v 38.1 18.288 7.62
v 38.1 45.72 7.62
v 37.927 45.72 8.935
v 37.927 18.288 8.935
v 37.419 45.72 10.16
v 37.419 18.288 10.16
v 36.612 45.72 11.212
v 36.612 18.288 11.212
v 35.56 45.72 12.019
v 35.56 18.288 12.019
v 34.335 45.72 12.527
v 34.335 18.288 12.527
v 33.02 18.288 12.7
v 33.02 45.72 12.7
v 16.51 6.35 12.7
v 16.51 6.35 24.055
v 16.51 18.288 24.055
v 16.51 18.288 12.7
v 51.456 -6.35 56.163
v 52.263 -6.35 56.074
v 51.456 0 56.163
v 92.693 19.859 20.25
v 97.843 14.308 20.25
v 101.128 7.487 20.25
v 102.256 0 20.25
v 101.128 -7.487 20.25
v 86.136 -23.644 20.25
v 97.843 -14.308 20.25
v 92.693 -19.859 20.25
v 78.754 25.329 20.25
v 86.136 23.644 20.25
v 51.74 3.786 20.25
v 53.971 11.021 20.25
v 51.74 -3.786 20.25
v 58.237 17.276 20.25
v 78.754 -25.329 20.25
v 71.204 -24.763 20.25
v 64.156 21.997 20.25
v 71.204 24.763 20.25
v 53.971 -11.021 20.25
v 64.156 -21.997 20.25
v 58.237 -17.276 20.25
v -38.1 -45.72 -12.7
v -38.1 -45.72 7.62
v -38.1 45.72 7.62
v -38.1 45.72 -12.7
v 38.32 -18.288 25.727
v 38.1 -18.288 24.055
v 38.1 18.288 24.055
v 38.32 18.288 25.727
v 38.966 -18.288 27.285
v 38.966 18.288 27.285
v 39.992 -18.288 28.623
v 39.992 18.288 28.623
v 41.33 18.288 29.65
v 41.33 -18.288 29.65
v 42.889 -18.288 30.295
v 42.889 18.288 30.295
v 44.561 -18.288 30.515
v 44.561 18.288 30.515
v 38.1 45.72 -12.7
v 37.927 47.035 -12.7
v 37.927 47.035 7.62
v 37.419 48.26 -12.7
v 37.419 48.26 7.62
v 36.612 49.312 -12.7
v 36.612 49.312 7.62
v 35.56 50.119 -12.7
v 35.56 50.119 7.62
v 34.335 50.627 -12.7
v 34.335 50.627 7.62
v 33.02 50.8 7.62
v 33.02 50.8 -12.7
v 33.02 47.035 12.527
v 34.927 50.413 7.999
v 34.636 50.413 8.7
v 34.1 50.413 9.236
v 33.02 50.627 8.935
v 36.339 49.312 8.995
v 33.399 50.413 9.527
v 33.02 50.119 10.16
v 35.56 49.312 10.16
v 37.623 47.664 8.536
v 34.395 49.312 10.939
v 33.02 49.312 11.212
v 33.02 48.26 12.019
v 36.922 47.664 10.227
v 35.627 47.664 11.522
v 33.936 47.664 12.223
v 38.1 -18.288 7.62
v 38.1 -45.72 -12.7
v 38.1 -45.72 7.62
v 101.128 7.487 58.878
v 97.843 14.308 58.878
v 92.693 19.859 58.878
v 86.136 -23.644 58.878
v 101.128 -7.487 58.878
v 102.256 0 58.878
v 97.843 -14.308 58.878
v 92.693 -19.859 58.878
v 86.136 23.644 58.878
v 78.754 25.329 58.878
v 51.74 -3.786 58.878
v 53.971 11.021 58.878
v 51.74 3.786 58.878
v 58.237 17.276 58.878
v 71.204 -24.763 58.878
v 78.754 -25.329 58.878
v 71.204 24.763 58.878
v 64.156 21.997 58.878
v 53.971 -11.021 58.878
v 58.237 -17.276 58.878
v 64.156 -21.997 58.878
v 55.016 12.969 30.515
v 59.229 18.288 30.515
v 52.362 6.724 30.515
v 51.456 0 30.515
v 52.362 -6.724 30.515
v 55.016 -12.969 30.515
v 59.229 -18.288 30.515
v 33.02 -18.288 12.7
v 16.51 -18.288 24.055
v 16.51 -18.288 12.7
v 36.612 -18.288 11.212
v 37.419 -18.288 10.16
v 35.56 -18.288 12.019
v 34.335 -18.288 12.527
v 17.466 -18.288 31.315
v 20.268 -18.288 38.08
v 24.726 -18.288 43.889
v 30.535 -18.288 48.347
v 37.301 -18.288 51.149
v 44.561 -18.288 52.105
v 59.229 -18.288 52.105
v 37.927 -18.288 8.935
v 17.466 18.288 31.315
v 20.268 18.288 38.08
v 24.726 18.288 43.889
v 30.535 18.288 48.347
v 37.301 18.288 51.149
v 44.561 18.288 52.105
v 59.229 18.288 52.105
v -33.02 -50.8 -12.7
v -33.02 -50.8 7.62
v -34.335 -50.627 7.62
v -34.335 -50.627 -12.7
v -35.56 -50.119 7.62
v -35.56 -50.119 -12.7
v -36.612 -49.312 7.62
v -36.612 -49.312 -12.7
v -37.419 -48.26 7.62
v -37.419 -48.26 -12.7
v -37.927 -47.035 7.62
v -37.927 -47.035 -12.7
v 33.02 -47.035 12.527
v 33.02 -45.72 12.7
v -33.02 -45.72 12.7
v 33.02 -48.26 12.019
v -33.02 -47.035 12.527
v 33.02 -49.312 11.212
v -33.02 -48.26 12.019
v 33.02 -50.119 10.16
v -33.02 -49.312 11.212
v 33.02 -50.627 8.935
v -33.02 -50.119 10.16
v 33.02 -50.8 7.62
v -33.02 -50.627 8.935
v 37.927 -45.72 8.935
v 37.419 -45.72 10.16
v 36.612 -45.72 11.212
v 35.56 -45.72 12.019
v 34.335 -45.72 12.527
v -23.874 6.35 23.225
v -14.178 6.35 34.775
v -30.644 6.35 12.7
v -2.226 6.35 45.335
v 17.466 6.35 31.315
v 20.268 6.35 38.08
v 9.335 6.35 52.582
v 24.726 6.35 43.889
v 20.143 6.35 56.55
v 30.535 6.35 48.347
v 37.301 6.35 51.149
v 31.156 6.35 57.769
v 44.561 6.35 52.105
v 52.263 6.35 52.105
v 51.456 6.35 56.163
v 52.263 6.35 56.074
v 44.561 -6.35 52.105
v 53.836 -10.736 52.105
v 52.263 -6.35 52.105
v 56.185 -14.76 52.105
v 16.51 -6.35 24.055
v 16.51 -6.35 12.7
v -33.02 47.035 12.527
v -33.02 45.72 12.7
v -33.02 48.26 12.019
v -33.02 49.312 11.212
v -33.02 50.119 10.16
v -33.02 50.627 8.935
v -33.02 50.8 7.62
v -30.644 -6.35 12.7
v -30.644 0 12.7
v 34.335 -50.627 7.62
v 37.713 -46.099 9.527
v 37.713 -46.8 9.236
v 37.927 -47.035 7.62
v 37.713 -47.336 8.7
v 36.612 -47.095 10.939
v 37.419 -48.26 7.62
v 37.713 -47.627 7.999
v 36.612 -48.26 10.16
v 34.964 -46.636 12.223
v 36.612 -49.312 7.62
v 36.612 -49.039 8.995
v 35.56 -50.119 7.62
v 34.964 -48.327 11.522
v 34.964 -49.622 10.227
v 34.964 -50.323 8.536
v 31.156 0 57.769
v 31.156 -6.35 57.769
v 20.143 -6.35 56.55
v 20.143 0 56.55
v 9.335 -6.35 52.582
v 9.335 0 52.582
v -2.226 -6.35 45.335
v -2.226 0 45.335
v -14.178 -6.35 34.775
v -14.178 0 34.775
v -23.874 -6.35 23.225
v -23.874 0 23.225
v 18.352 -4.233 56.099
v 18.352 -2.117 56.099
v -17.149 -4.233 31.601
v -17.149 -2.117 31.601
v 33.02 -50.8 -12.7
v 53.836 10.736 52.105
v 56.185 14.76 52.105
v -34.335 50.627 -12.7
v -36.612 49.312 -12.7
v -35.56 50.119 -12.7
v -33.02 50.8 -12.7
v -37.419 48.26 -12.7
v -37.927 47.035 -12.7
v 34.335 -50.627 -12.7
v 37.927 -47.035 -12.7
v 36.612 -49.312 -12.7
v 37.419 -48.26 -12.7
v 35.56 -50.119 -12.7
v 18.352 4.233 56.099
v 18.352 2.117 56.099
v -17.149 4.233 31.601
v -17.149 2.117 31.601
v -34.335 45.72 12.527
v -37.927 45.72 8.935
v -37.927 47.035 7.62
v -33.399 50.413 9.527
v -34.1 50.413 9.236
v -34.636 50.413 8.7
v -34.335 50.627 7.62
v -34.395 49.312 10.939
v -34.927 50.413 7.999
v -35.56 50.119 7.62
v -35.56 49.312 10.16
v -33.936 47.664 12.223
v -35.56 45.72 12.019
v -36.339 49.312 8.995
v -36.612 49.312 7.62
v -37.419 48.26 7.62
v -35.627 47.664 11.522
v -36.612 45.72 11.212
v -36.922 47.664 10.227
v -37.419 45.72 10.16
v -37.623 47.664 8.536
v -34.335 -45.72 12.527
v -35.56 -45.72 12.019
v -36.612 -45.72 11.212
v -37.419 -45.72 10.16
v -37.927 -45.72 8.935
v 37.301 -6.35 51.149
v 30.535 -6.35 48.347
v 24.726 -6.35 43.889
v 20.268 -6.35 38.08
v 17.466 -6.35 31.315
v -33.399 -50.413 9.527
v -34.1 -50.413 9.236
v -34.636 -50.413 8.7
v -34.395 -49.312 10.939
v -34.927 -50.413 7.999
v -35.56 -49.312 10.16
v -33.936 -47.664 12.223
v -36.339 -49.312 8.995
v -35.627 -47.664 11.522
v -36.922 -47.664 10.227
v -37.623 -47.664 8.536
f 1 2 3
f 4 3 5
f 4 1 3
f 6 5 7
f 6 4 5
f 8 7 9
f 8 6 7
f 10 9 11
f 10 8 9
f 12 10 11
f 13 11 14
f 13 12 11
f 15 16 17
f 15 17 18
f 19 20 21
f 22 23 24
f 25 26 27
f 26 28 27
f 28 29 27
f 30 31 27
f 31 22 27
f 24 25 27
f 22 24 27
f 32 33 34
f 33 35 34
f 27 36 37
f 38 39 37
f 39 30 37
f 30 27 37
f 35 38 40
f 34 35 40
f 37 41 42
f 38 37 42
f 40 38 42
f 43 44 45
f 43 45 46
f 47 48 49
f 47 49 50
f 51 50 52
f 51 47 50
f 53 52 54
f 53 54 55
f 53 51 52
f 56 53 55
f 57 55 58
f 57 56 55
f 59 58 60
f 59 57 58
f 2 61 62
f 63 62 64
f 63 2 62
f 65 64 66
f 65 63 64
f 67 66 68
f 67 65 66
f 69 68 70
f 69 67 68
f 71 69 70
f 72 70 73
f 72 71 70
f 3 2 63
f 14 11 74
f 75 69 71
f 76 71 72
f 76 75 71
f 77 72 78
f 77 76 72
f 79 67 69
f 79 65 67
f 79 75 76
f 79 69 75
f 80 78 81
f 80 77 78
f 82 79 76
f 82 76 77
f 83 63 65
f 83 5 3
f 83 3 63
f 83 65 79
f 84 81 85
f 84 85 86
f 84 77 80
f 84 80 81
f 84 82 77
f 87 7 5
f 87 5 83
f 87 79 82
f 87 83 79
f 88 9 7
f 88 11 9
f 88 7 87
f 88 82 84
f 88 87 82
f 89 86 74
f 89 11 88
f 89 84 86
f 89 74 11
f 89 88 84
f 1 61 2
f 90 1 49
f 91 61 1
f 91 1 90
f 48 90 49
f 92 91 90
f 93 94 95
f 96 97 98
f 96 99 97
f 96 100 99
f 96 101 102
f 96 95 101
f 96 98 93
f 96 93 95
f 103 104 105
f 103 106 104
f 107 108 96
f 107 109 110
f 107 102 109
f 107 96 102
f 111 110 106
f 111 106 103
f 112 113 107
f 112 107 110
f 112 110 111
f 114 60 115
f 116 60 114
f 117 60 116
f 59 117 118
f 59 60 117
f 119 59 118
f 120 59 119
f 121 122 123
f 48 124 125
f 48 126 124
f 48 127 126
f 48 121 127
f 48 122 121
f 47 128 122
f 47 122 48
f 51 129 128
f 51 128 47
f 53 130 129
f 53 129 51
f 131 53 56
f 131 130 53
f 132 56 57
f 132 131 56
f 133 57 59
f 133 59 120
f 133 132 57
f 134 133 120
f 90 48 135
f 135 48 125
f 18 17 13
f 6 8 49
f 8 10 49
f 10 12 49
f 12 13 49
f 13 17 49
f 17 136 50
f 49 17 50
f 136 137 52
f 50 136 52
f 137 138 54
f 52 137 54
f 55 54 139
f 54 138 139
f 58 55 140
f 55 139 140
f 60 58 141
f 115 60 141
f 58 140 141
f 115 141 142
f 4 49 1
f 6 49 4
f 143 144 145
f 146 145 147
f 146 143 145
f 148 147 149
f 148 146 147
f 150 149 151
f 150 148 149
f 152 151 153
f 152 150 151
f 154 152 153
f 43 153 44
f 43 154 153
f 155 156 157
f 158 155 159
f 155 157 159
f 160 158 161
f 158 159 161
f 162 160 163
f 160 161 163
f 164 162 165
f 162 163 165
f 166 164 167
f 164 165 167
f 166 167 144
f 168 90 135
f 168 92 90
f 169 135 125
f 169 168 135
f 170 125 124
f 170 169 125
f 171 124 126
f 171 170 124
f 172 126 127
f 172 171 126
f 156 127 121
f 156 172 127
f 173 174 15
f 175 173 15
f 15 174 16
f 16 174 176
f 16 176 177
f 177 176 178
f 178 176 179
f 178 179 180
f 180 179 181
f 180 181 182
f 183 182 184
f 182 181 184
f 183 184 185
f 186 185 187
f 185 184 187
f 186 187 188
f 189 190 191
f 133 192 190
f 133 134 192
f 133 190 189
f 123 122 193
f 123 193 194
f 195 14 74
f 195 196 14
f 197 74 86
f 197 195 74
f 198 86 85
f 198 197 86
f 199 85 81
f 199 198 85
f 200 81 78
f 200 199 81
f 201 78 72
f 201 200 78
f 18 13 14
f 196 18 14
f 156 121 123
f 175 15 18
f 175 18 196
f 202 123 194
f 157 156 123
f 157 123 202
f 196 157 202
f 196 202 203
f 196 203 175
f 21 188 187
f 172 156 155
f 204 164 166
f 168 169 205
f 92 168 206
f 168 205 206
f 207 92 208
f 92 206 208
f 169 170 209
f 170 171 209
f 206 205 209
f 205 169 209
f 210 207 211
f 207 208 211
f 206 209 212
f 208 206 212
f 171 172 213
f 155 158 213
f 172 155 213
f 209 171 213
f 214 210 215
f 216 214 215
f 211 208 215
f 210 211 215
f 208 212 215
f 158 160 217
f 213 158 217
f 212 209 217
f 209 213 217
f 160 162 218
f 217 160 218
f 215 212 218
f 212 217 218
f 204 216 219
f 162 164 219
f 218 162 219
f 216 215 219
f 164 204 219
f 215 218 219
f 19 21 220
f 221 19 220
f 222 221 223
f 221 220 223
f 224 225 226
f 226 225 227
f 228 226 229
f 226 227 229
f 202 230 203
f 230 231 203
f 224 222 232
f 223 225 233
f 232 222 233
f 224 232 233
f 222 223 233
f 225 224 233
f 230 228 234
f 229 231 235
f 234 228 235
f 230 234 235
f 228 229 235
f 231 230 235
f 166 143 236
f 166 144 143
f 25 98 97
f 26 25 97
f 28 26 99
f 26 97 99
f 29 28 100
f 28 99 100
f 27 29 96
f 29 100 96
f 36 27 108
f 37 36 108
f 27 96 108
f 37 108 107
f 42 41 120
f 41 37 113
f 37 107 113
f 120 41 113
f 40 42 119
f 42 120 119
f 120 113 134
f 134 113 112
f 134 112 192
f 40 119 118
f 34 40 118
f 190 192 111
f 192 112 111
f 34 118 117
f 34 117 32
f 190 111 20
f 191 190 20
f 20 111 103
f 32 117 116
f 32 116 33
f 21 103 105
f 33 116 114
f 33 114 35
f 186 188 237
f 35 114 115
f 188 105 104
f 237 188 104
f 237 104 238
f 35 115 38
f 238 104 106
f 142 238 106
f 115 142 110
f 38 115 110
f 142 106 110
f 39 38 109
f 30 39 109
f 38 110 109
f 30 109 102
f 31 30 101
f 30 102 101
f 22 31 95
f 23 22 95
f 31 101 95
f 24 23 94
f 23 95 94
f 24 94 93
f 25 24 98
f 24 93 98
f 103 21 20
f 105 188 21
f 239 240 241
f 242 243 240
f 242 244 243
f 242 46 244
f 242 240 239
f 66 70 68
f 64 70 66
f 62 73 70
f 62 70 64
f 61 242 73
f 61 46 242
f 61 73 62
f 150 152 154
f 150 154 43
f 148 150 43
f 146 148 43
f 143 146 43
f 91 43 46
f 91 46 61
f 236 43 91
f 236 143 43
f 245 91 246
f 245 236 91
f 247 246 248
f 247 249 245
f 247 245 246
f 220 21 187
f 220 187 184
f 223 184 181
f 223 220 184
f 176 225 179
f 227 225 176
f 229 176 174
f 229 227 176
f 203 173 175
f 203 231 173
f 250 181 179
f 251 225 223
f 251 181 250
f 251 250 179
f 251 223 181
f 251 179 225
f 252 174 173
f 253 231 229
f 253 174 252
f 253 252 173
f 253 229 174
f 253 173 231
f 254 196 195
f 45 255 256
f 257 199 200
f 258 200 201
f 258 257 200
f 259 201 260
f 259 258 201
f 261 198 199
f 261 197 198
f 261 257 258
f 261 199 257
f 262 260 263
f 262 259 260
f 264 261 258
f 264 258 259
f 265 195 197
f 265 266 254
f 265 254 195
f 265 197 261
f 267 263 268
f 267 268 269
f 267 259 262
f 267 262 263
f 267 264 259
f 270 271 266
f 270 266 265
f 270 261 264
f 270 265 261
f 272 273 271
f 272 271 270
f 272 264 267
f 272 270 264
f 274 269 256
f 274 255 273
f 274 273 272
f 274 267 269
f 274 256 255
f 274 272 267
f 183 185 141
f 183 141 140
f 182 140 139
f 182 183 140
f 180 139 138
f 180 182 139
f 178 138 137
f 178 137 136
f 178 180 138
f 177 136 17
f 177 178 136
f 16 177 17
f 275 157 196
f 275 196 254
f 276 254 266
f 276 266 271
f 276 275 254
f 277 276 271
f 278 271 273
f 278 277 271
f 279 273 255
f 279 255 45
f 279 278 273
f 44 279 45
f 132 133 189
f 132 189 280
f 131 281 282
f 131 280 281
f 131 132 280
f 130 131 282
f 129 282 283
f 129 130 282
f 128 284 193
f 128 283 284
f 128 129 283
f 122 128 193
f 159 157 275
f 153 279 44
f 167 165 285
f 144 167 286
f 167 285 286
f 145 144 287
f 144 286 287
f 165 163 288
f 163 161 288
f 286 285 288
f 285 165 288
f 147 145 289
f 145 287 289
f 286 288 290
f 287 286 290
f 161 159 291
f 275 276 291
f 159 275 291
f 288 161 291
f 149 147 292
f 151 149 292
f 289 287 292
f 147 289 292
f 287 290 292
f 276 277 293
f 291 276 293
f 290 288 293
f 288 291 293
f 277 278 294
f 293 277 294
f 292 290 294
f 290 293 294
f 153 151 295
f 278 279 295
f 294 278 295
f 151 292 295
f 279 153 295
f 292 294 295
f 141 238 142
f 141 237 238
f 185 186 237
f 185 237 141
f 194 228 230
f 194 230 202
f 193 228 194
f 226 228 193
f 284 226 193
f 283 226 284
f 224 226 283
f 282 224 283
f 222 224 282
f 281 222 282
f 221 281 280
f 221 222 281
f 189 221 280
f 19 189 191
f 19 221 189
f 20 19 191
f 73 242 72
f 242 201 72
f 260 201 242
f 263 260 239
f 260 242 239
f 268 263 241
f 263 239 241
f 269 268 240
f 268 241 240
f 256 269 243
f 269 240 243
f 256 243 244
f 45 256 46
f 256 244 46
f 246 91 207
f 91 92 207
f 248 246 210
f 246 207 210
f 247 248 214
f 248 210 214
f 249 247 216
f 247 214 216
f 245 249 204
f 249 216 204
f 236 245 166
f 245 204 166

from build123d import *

# Parameters (mm, degrees)
F1_DEPTH = 50.8
F2_DEPTH = 18.288
F3_DEPTH = 6.35
F0_W     = 25.4
F0_H     = 38.6286331601
F5_R     = 5.08


with BuildPart() as f1:
    # F0 (on Front) → F1 (new body, symmetric)
    with BuildSketch(Plane.XZ):
        Polygon((38.1, -12.7), (38.1, 12.7), (16.5100004677, 12.7), (-30.6439399719, 12.7), (-38.1, 12.7), (-38.1, -12.7), align=None)
    extrude(amount=F1_DEPTH, both=True)

    # F0 (on Front) → F2 (join, symmetric)
    with BuildSketch(Plane.XZ):
        with BuildLine():
            Line((16.5100004677, 12.7), (38.1, 12.7))
            Line((38.1, 12.7), (38.1, 24.0545344999))
            ThreePointArc((38.1, 24.0545344999), (39.9923105597, 28.6229763174), (44.5607523772, 30.5152868771))
            Line((44.5607523772, 30.5152868771), (51.4560379088, 30.5152868771))
            Line((51.4560379088, 30.5152868771), (51.4560379088, 52.1052864094))
            Line((51.4560379088, 52.1052864094), (44.5607523772, 52.1052864094))
            ThreePointArc((44.5607523772, 52.1052864094), (24.7258754846, 43.8894113925), (16.5100004677, 24.0545344999))
            Line((16.5100004677, 24.0545344999), (16.5100004677, 12.7))
        make_face()
        Polygon((51.4560379088, 52.1052864094), (51.4560379088, 30.5152868771), (64.020066675, 30.5152868771), (64.020066675, 52.1052864094), (58.4391281009, 52.1052864094), align=None)
    extrude(amount=F2_DEPTH, both=True)

    # F0 (on Front) → F3 (join, symmetric)
    with BuildSketch(Plane.XZ):
        with BuildLine():
            Line((-30.6439399719, 12.7), (16.5100004677, 12.7))
            Line((16.5100004677, 12.7), (16.5100004677, 24.0545344999))
            ThreePointArc((16.5100004677, 24.0545344999), (24.7258754846, 43.8894113925), (44.5607523772, 52.1052864094))
            Line((44.5607523772, 52.1052864094), (51.4560379088, 52.1052864094))
            Line((51.4560379088, 52.1052864094), (51.4560379088, 56.1626598461))
            add(Edge.make_bspline(
                [(51.4560379088, 56.1626598461), (40.4668177648, 57.3816540823), (15.1828966136, 61.2777253632), (-18.425734597, 32.7653036797), (-26.9961953148, 18.7397968243), (-30.6439399719, 12.7)],
                knots=[0.062706619, 0.062706619, 0.062706619, 0.062706619, 0.3573556866, 0.7280176576, 1, 1, 1, 1], degree=3))
        make_face()
        with BuildLine():
            add(Edge.make_bspline(
                [(58.4391281009, 55.5037148297), (56.1240075207, 55.6667510787), (53.7947415268, 55.9032359568), (51.4560379088, 56.1626598461)],
                knots=[0, 0, 0, 0, 0.062706619, 0.062706619, 0.062706619, 0.062706619], degree=3))
            Line((51.4560379088, 56.1626598461), (51.4560379088, 52.1052864094))
            Line((51.4560379088, 52.1052864094), (58.4391281009, 52.1052864094))
            Line((58.4391281009, 52.1052864094), (58.4391281009, 55.5037148297))
        make_face()
    extrude(amount=F3_DEPTH, both=True)

    # F0 (on Front) → F4 (revolve)
    with BuildSketch(Plane.XZ):
        with Locations((89.5560379088, 39.5638855255)):
            Rectangle(F0_W, F0_H)
    revolve(axis=Axis((76.8560379088, 0, 39.5638855255), (0, 0, -1)))

    # F5
    f5_edges = [f1.edges().sort_by_distance(p)[0] for p in [
        (-38.1, 0, 12.7),
        (0, -50.8, 12.7),
        (38.1, -34.544, 12.7),
        (38.1, -50.8, 0),
        (-38.1, -50.8, 0),
        (38.1, 34.544, 12.7),
        (38.1, 50.8, 0),
        (0, 50.8, 12.7),
        (-38.1, 50.8, 0),
    ]]
    fillet(f5_edges, radius=F5_R)


solid = f1.part
